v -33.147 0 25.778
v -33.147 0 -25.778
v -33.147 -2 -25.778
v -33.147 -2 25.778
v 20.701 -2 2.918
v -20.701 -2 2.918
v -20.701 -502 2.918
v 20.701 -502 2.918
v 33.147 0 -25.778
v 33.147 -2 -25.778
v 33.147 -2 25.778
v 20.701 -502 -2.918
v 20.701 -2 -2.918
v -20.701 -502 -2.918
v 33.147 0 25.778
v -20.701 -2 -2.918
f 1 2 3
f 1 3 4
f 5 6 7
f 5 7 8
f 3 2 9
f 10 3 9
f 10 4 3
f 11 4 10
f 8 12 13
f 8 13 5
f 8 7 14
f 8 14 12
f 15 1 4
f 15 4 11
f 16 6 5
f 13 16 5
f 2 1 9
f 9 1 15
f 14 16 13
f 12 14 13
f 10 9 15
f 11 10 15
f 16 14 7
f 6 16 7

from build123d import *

# Parameters (mm, degrees)
F0_W     = 66.294
F0_H     = 51.55671
F1_DEPTH = 2
F2_W     = 41.402
F2_H     = 5.83671
F3_DEPTH = 500


with BuildPart() as f1:
    # F0 (on Front) → F1 (new body)
    with BuildSketch(Plane.XZ):
        Rectangle(F0_W, F0_H)
    extrude(amount=F1_DEPTH)


with BuildPart() as f3:
    # F2 (on face) → F3 (new body)
    with BuildSketch(Plane.XZ.offset(2)):
        Rectangle(F2_W, F2_H)
    extrude(amount=F3_DEPTH)


solid = Compound([f1.part, f3.part])
